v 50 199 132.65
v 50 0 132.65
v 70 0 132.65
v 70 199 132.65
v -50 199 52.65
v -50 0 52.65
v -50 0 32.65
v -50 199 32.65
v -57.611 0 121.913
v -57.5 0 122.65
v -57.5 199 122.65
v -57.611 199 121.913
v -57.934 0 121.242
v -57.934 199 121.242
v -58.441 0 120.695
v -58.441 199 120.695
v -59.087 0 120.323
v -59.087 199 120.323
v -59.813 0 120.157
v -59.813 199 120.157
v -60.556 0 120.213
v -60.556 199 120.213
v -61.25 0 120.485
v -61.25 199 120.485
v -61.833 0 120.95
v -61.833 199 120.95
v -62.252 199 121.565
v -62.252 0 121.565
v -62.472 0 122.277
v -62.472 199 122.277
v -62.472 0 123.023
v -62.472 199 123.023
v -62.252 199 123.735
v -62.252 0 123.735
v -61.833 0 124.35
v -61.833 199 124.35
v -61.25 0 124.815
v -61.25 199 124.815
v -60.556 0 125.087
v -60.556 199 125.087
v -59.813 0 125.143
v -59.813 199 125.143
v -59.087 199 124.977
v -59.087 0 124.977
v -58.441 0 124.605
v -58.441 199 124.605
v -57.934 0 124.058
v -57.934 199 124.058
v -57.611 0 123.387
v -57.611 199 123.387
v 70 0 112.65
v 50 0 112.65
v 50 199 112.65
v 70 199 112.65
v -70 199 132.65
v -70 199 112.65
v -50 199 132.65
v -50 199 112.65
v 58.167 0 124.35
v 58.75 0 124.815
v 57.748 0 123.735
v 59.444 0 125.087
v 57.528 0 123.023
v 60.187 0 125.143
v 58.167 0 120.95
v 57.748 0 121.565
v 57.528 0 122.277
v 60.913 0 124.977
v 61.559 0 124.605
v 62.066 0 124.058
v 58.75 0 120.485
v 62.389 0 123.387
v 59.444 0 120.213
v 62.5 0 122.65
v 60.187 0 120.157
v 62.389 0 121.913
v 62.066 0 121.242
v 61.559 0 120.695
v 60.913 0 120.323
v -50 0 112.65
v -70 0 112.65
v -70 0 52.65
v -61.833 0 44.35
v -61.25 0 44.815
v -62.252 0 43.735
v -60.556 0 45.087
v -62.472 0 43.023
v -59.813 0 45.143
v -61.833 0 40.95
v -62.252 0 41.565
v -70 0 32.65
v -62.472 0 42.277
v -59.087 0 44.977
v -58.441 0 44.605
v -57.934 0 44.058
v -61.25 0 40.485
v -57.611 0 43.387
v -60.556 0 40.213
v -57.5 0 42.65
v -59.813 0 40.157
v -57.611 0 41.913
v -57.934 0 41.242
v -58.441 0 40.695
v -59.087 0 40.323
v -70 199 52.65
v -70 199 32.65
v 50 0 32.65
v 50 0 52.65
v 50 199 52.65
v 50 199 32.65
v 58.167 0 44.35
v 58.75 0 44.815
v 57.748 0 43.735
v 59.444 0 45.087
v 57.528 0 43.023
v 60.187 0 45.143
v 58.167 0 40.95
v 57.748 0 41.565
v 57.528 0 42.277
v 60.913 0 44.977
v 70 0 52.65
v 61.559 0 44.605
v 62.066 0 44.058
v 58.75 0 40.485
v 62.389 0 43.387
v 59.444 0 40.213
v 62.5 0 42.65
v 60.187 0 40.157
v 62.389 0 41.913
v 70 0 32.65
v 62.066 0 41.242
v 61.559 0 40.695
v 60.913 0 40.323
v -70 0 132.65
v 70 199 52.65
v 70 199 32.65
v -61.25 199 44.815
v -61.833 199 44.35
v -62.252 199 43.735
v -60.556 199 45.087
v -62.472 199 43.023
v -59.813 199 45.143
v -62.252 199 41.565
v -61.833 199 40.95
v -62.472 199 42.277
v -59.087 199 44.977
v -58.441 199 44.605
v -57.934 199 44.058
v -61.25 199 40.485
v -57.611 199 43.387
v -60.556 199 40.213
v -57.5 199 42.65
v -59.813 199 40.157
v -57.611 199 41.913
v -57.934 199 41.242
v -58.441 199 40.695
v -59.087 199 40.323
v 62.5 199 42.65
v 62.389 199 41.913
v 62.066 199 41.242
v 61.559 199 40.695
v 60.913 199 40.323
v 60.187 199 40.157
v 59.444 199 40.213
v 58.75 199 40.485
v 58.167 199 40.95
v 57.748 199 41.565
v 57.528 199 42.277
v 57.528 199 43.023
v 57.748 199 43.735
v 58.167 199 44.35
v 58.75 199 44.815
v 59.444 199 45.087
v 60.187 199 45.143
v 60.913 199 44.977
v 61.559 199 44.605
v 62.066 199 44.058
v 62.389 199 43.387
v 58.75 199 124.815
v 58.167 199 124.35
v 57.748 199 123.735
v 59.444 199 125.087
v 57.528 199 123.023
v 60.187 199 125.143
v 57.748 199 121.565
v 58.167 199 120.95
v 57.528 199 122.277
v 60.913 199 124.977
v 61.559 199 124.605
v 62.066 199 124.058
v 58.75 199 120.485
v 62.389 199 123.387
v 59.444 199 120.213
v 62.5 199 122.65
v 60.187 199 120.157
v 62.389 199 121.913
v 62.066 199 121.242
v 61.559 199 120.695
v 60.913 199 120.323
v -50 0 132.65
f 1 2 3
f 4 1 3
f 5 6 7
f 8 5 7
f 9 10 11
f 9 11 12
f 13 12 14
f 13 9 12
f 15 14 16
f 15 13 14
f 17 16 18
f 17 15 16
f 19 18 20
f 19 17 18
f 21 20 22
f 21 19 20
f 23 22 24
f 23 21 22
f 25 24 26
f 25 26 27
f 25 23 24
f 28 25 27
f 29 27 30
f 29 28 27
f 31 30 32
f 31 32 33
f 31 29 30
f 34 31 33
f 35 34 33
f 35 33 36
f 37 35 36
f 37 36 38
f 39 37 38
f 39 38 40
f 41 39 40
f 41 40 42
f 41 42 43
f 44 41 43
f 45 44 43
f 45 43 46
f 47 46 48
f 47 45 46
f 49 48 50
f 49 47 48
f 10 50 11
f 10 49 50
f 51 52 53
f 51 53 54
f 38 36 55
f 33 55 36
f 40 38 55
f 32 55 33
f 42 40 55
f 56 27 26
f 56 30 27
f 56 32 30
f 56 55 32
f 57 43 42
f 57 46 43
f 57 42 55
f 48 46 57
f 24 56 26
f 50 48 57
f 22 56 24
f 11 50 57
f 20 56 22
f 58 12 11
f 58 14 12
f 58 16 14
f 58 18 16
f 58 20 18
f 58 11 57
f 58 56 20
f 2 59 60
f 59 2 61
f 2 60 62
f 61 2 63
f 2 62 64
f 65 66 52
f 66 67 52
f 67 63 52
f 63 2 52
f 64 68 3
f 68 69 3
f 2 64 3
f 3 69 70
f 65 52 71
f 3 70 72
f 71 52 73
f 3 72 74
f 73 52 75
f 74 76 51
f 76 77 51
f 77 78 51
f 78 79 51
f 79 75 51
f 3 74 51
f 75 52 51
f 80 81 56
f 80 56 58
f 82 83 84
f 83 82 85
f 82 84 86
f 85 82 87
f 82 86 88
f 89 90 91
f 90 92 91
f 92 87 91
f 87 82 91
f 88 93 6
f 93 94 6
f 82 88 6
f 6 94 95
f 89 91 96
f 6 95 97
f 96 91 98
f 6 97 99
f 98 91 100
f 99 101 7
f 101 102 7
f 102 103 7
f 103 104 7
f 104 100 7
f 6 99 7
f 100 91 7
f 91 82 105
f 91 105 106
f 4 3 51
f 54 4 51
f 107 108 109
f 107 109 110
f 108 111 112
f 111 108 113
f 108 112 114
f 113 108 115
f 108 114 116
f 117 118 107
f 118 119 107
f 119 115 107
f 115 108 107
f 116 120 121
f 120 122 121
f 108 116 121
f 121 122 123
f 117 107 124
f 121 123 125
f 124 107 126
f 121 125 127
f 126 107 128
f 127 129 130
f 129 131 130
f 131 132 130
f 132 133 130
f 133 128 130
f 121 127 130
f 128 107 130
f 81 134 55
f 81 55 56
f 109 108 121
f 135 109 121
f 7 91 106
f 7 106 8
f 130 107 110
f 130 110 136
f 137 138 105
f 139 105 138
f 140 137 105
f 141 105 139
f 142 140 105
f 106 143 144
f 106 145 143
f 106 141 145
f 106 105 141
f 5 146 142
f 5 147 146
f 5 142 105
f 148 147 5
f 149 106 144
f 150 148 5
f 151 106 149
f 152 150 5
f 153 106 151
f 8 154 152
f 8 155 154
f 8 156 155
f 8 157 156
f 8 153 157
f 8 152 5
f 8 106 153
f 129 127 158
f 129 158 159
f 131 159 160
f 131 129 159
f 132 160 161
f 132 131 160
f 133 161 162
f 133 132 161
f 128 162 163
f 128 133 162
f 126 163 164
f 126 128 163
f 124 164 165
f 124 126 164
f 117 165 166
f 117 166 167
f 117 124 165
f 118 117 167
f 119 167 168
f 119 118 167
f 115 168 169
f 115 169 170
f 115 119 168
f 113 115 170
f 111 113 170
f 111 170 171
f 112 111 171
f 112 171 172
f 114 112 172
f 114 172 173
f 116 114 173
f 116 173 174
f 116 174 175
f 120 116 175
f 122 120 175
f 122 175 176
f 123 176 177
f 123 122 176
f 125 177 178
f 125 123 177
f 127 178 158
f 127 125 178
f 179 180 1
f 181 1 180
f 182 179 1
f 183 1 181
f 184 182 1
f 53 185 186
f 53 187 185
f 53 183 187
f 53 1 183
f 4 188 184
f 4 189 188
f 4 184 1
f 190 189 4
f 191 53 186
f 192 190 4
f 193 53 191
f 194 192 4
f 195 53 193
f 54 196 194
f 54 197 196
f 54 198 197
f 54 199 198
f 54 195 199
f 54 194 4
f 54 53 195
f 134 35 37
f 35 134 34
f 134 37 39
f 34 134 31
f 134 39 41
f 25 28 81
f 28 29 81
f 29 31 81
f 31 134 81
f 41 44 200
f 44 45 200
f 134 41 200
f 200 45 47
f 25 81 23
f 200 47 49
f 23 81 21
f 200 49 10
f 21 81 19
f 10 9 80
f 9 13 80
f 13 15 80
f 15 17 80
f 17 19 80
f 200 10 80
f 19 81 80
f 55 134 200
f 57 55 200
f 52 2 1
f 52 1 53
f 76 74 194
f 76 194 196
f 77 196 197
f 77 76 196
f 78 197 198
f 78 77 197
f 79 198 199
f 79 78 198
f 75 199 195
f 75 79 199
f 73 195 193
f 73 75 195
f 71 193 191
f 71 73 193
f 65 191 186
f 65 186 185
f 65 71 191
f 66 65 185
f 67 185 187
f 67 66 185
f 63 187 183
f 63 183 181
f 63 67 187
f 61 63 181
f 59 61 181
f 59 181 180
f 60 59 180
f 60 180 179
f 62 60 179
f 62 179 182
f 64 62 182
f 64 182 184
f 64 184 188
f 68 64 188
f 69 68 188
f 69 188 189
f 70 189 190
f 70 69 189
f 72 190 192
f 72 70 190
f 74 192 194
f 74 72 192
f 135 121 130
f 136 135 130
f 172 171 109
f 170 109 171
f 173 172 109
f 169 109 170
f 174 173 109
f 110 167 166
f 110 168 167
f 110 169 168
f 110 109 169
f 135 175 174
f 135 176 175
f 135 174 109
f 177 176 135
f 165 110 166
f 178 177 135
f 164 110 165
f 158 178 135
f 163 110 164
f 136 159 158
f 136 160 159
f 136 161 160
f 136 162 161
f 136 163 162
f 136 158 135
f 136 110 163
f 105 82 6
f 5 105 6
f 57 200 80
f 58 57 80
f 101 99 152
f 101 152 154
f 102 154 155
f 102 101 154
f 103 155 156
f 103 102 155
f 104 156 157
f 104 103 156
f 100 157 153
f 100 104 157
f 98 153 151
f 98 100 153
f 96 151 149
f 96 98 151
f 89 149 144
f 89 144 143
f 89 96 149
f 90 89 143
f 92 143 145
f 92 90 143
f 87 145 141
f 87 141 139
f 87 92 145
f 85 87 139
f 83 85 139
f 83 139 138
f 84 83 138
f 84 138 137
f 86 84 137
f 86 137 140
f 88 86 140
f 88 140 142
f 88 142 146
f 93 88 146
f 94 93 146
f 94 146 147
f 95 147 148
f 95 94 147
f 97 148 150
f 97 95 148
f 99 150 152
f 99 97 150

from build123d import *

# Parameters (mm, degrees)
SKIZZE3_W                         = 20
SKIZZE3_H                         = 20
SKIZZE3_R                         = 2.5
AUFSATZ_LINEAR_AUSTRAGEN1_DEPTH   = 199
AUFSATZ_LINEAR_AUSTRAGEN1_2_DEPTH = 199
AUFSATZ_LINEAR_AUSTRAGEN1_3_DEPTH = 199
AUFSATZ_LINEAR_AUSTRAGEN1_4_DEPTH = 199


with BuildPart() as part:
    # Skizze3 → Aufsatz-Linear austragen1 (new body)
    with BuildSketch(Plane(origin=(0, 0, 0), x_dir=(1, 0, 0), z_dir=(0, 1, 0))):
        with Locations((-60, -42.65)):
            Rectangle(SKIZZE3_W, SKIZZE3_H)
        with Locations((-60, -42.65)):
            Circle(SKIZZE3_R, mode=Mode.SUBTRACT)
    extrude(amount=AUFSATZ_LINEAR_AUSTRAGEN1_DEPTH)


with BuildPart() as body_2:
    # Skizze3 → Aufsatz-Linear austragen1 2 (new body)
    with BuildSketch(Plane(origin=(0, 0, 0), x_dir=(1, 0, 0), z_dir=(0, 1, 0))):
        with Locations((60, -42.65)):
            Rectangle(SKIZZE3_W, SKIZZE3_H)
        with Locations((60, -42.65)):
            Circle(SKIZZE3_R, mode=Mode.SUBTRACT)
    extrude(amount=AUFSATZ_LINEAR_AUSTRAGEN1_2_DEPTH)


with BuildPart() as body_3:
    # Skizze3 → Aufsatz-Linear austragen1 3 (new body)
    with BuildSketch(Plane(origin=(0, 0, 0), x_dir=(1, 0, 0), z_dir=(0, 1, 0))):
        with Locations((60, -122.65)):
            Rectangle(SKIZZE3_W, SKIZZE3_H)
        with Locations((60, -122.65)):
            Circle(SKIZZE3_R, mode=Mode.SUBTRACT)
    extrude(amount=AUFSATZ_LINEAR_AUSTRAGEN1_3_DEPTH)


with BuildPart() as body_4:
    # Skizze3 → Aufsatz-Linear austragen1 4 (new body)
    with BuildSketch(Plane(origin=(0, 0, 0), x_dir=(1, 0, 0), z_dir=(0, 1, 0))):
        with Locations((-60, -122.65)):
            Rectangle(SKIZZE3_W, SKIZZE3_H)
        with Locations((-60, -122.65)):
            Circle(SKIZZE3_R, mode=Mode.SUBTRACT)
    extrude(amount=AUFSATZ_LINEAR_AUSTRAGEN1_4_DEPTH)


solid = Compound([part.part, body_2.part, body_3.part, body_4.part])
